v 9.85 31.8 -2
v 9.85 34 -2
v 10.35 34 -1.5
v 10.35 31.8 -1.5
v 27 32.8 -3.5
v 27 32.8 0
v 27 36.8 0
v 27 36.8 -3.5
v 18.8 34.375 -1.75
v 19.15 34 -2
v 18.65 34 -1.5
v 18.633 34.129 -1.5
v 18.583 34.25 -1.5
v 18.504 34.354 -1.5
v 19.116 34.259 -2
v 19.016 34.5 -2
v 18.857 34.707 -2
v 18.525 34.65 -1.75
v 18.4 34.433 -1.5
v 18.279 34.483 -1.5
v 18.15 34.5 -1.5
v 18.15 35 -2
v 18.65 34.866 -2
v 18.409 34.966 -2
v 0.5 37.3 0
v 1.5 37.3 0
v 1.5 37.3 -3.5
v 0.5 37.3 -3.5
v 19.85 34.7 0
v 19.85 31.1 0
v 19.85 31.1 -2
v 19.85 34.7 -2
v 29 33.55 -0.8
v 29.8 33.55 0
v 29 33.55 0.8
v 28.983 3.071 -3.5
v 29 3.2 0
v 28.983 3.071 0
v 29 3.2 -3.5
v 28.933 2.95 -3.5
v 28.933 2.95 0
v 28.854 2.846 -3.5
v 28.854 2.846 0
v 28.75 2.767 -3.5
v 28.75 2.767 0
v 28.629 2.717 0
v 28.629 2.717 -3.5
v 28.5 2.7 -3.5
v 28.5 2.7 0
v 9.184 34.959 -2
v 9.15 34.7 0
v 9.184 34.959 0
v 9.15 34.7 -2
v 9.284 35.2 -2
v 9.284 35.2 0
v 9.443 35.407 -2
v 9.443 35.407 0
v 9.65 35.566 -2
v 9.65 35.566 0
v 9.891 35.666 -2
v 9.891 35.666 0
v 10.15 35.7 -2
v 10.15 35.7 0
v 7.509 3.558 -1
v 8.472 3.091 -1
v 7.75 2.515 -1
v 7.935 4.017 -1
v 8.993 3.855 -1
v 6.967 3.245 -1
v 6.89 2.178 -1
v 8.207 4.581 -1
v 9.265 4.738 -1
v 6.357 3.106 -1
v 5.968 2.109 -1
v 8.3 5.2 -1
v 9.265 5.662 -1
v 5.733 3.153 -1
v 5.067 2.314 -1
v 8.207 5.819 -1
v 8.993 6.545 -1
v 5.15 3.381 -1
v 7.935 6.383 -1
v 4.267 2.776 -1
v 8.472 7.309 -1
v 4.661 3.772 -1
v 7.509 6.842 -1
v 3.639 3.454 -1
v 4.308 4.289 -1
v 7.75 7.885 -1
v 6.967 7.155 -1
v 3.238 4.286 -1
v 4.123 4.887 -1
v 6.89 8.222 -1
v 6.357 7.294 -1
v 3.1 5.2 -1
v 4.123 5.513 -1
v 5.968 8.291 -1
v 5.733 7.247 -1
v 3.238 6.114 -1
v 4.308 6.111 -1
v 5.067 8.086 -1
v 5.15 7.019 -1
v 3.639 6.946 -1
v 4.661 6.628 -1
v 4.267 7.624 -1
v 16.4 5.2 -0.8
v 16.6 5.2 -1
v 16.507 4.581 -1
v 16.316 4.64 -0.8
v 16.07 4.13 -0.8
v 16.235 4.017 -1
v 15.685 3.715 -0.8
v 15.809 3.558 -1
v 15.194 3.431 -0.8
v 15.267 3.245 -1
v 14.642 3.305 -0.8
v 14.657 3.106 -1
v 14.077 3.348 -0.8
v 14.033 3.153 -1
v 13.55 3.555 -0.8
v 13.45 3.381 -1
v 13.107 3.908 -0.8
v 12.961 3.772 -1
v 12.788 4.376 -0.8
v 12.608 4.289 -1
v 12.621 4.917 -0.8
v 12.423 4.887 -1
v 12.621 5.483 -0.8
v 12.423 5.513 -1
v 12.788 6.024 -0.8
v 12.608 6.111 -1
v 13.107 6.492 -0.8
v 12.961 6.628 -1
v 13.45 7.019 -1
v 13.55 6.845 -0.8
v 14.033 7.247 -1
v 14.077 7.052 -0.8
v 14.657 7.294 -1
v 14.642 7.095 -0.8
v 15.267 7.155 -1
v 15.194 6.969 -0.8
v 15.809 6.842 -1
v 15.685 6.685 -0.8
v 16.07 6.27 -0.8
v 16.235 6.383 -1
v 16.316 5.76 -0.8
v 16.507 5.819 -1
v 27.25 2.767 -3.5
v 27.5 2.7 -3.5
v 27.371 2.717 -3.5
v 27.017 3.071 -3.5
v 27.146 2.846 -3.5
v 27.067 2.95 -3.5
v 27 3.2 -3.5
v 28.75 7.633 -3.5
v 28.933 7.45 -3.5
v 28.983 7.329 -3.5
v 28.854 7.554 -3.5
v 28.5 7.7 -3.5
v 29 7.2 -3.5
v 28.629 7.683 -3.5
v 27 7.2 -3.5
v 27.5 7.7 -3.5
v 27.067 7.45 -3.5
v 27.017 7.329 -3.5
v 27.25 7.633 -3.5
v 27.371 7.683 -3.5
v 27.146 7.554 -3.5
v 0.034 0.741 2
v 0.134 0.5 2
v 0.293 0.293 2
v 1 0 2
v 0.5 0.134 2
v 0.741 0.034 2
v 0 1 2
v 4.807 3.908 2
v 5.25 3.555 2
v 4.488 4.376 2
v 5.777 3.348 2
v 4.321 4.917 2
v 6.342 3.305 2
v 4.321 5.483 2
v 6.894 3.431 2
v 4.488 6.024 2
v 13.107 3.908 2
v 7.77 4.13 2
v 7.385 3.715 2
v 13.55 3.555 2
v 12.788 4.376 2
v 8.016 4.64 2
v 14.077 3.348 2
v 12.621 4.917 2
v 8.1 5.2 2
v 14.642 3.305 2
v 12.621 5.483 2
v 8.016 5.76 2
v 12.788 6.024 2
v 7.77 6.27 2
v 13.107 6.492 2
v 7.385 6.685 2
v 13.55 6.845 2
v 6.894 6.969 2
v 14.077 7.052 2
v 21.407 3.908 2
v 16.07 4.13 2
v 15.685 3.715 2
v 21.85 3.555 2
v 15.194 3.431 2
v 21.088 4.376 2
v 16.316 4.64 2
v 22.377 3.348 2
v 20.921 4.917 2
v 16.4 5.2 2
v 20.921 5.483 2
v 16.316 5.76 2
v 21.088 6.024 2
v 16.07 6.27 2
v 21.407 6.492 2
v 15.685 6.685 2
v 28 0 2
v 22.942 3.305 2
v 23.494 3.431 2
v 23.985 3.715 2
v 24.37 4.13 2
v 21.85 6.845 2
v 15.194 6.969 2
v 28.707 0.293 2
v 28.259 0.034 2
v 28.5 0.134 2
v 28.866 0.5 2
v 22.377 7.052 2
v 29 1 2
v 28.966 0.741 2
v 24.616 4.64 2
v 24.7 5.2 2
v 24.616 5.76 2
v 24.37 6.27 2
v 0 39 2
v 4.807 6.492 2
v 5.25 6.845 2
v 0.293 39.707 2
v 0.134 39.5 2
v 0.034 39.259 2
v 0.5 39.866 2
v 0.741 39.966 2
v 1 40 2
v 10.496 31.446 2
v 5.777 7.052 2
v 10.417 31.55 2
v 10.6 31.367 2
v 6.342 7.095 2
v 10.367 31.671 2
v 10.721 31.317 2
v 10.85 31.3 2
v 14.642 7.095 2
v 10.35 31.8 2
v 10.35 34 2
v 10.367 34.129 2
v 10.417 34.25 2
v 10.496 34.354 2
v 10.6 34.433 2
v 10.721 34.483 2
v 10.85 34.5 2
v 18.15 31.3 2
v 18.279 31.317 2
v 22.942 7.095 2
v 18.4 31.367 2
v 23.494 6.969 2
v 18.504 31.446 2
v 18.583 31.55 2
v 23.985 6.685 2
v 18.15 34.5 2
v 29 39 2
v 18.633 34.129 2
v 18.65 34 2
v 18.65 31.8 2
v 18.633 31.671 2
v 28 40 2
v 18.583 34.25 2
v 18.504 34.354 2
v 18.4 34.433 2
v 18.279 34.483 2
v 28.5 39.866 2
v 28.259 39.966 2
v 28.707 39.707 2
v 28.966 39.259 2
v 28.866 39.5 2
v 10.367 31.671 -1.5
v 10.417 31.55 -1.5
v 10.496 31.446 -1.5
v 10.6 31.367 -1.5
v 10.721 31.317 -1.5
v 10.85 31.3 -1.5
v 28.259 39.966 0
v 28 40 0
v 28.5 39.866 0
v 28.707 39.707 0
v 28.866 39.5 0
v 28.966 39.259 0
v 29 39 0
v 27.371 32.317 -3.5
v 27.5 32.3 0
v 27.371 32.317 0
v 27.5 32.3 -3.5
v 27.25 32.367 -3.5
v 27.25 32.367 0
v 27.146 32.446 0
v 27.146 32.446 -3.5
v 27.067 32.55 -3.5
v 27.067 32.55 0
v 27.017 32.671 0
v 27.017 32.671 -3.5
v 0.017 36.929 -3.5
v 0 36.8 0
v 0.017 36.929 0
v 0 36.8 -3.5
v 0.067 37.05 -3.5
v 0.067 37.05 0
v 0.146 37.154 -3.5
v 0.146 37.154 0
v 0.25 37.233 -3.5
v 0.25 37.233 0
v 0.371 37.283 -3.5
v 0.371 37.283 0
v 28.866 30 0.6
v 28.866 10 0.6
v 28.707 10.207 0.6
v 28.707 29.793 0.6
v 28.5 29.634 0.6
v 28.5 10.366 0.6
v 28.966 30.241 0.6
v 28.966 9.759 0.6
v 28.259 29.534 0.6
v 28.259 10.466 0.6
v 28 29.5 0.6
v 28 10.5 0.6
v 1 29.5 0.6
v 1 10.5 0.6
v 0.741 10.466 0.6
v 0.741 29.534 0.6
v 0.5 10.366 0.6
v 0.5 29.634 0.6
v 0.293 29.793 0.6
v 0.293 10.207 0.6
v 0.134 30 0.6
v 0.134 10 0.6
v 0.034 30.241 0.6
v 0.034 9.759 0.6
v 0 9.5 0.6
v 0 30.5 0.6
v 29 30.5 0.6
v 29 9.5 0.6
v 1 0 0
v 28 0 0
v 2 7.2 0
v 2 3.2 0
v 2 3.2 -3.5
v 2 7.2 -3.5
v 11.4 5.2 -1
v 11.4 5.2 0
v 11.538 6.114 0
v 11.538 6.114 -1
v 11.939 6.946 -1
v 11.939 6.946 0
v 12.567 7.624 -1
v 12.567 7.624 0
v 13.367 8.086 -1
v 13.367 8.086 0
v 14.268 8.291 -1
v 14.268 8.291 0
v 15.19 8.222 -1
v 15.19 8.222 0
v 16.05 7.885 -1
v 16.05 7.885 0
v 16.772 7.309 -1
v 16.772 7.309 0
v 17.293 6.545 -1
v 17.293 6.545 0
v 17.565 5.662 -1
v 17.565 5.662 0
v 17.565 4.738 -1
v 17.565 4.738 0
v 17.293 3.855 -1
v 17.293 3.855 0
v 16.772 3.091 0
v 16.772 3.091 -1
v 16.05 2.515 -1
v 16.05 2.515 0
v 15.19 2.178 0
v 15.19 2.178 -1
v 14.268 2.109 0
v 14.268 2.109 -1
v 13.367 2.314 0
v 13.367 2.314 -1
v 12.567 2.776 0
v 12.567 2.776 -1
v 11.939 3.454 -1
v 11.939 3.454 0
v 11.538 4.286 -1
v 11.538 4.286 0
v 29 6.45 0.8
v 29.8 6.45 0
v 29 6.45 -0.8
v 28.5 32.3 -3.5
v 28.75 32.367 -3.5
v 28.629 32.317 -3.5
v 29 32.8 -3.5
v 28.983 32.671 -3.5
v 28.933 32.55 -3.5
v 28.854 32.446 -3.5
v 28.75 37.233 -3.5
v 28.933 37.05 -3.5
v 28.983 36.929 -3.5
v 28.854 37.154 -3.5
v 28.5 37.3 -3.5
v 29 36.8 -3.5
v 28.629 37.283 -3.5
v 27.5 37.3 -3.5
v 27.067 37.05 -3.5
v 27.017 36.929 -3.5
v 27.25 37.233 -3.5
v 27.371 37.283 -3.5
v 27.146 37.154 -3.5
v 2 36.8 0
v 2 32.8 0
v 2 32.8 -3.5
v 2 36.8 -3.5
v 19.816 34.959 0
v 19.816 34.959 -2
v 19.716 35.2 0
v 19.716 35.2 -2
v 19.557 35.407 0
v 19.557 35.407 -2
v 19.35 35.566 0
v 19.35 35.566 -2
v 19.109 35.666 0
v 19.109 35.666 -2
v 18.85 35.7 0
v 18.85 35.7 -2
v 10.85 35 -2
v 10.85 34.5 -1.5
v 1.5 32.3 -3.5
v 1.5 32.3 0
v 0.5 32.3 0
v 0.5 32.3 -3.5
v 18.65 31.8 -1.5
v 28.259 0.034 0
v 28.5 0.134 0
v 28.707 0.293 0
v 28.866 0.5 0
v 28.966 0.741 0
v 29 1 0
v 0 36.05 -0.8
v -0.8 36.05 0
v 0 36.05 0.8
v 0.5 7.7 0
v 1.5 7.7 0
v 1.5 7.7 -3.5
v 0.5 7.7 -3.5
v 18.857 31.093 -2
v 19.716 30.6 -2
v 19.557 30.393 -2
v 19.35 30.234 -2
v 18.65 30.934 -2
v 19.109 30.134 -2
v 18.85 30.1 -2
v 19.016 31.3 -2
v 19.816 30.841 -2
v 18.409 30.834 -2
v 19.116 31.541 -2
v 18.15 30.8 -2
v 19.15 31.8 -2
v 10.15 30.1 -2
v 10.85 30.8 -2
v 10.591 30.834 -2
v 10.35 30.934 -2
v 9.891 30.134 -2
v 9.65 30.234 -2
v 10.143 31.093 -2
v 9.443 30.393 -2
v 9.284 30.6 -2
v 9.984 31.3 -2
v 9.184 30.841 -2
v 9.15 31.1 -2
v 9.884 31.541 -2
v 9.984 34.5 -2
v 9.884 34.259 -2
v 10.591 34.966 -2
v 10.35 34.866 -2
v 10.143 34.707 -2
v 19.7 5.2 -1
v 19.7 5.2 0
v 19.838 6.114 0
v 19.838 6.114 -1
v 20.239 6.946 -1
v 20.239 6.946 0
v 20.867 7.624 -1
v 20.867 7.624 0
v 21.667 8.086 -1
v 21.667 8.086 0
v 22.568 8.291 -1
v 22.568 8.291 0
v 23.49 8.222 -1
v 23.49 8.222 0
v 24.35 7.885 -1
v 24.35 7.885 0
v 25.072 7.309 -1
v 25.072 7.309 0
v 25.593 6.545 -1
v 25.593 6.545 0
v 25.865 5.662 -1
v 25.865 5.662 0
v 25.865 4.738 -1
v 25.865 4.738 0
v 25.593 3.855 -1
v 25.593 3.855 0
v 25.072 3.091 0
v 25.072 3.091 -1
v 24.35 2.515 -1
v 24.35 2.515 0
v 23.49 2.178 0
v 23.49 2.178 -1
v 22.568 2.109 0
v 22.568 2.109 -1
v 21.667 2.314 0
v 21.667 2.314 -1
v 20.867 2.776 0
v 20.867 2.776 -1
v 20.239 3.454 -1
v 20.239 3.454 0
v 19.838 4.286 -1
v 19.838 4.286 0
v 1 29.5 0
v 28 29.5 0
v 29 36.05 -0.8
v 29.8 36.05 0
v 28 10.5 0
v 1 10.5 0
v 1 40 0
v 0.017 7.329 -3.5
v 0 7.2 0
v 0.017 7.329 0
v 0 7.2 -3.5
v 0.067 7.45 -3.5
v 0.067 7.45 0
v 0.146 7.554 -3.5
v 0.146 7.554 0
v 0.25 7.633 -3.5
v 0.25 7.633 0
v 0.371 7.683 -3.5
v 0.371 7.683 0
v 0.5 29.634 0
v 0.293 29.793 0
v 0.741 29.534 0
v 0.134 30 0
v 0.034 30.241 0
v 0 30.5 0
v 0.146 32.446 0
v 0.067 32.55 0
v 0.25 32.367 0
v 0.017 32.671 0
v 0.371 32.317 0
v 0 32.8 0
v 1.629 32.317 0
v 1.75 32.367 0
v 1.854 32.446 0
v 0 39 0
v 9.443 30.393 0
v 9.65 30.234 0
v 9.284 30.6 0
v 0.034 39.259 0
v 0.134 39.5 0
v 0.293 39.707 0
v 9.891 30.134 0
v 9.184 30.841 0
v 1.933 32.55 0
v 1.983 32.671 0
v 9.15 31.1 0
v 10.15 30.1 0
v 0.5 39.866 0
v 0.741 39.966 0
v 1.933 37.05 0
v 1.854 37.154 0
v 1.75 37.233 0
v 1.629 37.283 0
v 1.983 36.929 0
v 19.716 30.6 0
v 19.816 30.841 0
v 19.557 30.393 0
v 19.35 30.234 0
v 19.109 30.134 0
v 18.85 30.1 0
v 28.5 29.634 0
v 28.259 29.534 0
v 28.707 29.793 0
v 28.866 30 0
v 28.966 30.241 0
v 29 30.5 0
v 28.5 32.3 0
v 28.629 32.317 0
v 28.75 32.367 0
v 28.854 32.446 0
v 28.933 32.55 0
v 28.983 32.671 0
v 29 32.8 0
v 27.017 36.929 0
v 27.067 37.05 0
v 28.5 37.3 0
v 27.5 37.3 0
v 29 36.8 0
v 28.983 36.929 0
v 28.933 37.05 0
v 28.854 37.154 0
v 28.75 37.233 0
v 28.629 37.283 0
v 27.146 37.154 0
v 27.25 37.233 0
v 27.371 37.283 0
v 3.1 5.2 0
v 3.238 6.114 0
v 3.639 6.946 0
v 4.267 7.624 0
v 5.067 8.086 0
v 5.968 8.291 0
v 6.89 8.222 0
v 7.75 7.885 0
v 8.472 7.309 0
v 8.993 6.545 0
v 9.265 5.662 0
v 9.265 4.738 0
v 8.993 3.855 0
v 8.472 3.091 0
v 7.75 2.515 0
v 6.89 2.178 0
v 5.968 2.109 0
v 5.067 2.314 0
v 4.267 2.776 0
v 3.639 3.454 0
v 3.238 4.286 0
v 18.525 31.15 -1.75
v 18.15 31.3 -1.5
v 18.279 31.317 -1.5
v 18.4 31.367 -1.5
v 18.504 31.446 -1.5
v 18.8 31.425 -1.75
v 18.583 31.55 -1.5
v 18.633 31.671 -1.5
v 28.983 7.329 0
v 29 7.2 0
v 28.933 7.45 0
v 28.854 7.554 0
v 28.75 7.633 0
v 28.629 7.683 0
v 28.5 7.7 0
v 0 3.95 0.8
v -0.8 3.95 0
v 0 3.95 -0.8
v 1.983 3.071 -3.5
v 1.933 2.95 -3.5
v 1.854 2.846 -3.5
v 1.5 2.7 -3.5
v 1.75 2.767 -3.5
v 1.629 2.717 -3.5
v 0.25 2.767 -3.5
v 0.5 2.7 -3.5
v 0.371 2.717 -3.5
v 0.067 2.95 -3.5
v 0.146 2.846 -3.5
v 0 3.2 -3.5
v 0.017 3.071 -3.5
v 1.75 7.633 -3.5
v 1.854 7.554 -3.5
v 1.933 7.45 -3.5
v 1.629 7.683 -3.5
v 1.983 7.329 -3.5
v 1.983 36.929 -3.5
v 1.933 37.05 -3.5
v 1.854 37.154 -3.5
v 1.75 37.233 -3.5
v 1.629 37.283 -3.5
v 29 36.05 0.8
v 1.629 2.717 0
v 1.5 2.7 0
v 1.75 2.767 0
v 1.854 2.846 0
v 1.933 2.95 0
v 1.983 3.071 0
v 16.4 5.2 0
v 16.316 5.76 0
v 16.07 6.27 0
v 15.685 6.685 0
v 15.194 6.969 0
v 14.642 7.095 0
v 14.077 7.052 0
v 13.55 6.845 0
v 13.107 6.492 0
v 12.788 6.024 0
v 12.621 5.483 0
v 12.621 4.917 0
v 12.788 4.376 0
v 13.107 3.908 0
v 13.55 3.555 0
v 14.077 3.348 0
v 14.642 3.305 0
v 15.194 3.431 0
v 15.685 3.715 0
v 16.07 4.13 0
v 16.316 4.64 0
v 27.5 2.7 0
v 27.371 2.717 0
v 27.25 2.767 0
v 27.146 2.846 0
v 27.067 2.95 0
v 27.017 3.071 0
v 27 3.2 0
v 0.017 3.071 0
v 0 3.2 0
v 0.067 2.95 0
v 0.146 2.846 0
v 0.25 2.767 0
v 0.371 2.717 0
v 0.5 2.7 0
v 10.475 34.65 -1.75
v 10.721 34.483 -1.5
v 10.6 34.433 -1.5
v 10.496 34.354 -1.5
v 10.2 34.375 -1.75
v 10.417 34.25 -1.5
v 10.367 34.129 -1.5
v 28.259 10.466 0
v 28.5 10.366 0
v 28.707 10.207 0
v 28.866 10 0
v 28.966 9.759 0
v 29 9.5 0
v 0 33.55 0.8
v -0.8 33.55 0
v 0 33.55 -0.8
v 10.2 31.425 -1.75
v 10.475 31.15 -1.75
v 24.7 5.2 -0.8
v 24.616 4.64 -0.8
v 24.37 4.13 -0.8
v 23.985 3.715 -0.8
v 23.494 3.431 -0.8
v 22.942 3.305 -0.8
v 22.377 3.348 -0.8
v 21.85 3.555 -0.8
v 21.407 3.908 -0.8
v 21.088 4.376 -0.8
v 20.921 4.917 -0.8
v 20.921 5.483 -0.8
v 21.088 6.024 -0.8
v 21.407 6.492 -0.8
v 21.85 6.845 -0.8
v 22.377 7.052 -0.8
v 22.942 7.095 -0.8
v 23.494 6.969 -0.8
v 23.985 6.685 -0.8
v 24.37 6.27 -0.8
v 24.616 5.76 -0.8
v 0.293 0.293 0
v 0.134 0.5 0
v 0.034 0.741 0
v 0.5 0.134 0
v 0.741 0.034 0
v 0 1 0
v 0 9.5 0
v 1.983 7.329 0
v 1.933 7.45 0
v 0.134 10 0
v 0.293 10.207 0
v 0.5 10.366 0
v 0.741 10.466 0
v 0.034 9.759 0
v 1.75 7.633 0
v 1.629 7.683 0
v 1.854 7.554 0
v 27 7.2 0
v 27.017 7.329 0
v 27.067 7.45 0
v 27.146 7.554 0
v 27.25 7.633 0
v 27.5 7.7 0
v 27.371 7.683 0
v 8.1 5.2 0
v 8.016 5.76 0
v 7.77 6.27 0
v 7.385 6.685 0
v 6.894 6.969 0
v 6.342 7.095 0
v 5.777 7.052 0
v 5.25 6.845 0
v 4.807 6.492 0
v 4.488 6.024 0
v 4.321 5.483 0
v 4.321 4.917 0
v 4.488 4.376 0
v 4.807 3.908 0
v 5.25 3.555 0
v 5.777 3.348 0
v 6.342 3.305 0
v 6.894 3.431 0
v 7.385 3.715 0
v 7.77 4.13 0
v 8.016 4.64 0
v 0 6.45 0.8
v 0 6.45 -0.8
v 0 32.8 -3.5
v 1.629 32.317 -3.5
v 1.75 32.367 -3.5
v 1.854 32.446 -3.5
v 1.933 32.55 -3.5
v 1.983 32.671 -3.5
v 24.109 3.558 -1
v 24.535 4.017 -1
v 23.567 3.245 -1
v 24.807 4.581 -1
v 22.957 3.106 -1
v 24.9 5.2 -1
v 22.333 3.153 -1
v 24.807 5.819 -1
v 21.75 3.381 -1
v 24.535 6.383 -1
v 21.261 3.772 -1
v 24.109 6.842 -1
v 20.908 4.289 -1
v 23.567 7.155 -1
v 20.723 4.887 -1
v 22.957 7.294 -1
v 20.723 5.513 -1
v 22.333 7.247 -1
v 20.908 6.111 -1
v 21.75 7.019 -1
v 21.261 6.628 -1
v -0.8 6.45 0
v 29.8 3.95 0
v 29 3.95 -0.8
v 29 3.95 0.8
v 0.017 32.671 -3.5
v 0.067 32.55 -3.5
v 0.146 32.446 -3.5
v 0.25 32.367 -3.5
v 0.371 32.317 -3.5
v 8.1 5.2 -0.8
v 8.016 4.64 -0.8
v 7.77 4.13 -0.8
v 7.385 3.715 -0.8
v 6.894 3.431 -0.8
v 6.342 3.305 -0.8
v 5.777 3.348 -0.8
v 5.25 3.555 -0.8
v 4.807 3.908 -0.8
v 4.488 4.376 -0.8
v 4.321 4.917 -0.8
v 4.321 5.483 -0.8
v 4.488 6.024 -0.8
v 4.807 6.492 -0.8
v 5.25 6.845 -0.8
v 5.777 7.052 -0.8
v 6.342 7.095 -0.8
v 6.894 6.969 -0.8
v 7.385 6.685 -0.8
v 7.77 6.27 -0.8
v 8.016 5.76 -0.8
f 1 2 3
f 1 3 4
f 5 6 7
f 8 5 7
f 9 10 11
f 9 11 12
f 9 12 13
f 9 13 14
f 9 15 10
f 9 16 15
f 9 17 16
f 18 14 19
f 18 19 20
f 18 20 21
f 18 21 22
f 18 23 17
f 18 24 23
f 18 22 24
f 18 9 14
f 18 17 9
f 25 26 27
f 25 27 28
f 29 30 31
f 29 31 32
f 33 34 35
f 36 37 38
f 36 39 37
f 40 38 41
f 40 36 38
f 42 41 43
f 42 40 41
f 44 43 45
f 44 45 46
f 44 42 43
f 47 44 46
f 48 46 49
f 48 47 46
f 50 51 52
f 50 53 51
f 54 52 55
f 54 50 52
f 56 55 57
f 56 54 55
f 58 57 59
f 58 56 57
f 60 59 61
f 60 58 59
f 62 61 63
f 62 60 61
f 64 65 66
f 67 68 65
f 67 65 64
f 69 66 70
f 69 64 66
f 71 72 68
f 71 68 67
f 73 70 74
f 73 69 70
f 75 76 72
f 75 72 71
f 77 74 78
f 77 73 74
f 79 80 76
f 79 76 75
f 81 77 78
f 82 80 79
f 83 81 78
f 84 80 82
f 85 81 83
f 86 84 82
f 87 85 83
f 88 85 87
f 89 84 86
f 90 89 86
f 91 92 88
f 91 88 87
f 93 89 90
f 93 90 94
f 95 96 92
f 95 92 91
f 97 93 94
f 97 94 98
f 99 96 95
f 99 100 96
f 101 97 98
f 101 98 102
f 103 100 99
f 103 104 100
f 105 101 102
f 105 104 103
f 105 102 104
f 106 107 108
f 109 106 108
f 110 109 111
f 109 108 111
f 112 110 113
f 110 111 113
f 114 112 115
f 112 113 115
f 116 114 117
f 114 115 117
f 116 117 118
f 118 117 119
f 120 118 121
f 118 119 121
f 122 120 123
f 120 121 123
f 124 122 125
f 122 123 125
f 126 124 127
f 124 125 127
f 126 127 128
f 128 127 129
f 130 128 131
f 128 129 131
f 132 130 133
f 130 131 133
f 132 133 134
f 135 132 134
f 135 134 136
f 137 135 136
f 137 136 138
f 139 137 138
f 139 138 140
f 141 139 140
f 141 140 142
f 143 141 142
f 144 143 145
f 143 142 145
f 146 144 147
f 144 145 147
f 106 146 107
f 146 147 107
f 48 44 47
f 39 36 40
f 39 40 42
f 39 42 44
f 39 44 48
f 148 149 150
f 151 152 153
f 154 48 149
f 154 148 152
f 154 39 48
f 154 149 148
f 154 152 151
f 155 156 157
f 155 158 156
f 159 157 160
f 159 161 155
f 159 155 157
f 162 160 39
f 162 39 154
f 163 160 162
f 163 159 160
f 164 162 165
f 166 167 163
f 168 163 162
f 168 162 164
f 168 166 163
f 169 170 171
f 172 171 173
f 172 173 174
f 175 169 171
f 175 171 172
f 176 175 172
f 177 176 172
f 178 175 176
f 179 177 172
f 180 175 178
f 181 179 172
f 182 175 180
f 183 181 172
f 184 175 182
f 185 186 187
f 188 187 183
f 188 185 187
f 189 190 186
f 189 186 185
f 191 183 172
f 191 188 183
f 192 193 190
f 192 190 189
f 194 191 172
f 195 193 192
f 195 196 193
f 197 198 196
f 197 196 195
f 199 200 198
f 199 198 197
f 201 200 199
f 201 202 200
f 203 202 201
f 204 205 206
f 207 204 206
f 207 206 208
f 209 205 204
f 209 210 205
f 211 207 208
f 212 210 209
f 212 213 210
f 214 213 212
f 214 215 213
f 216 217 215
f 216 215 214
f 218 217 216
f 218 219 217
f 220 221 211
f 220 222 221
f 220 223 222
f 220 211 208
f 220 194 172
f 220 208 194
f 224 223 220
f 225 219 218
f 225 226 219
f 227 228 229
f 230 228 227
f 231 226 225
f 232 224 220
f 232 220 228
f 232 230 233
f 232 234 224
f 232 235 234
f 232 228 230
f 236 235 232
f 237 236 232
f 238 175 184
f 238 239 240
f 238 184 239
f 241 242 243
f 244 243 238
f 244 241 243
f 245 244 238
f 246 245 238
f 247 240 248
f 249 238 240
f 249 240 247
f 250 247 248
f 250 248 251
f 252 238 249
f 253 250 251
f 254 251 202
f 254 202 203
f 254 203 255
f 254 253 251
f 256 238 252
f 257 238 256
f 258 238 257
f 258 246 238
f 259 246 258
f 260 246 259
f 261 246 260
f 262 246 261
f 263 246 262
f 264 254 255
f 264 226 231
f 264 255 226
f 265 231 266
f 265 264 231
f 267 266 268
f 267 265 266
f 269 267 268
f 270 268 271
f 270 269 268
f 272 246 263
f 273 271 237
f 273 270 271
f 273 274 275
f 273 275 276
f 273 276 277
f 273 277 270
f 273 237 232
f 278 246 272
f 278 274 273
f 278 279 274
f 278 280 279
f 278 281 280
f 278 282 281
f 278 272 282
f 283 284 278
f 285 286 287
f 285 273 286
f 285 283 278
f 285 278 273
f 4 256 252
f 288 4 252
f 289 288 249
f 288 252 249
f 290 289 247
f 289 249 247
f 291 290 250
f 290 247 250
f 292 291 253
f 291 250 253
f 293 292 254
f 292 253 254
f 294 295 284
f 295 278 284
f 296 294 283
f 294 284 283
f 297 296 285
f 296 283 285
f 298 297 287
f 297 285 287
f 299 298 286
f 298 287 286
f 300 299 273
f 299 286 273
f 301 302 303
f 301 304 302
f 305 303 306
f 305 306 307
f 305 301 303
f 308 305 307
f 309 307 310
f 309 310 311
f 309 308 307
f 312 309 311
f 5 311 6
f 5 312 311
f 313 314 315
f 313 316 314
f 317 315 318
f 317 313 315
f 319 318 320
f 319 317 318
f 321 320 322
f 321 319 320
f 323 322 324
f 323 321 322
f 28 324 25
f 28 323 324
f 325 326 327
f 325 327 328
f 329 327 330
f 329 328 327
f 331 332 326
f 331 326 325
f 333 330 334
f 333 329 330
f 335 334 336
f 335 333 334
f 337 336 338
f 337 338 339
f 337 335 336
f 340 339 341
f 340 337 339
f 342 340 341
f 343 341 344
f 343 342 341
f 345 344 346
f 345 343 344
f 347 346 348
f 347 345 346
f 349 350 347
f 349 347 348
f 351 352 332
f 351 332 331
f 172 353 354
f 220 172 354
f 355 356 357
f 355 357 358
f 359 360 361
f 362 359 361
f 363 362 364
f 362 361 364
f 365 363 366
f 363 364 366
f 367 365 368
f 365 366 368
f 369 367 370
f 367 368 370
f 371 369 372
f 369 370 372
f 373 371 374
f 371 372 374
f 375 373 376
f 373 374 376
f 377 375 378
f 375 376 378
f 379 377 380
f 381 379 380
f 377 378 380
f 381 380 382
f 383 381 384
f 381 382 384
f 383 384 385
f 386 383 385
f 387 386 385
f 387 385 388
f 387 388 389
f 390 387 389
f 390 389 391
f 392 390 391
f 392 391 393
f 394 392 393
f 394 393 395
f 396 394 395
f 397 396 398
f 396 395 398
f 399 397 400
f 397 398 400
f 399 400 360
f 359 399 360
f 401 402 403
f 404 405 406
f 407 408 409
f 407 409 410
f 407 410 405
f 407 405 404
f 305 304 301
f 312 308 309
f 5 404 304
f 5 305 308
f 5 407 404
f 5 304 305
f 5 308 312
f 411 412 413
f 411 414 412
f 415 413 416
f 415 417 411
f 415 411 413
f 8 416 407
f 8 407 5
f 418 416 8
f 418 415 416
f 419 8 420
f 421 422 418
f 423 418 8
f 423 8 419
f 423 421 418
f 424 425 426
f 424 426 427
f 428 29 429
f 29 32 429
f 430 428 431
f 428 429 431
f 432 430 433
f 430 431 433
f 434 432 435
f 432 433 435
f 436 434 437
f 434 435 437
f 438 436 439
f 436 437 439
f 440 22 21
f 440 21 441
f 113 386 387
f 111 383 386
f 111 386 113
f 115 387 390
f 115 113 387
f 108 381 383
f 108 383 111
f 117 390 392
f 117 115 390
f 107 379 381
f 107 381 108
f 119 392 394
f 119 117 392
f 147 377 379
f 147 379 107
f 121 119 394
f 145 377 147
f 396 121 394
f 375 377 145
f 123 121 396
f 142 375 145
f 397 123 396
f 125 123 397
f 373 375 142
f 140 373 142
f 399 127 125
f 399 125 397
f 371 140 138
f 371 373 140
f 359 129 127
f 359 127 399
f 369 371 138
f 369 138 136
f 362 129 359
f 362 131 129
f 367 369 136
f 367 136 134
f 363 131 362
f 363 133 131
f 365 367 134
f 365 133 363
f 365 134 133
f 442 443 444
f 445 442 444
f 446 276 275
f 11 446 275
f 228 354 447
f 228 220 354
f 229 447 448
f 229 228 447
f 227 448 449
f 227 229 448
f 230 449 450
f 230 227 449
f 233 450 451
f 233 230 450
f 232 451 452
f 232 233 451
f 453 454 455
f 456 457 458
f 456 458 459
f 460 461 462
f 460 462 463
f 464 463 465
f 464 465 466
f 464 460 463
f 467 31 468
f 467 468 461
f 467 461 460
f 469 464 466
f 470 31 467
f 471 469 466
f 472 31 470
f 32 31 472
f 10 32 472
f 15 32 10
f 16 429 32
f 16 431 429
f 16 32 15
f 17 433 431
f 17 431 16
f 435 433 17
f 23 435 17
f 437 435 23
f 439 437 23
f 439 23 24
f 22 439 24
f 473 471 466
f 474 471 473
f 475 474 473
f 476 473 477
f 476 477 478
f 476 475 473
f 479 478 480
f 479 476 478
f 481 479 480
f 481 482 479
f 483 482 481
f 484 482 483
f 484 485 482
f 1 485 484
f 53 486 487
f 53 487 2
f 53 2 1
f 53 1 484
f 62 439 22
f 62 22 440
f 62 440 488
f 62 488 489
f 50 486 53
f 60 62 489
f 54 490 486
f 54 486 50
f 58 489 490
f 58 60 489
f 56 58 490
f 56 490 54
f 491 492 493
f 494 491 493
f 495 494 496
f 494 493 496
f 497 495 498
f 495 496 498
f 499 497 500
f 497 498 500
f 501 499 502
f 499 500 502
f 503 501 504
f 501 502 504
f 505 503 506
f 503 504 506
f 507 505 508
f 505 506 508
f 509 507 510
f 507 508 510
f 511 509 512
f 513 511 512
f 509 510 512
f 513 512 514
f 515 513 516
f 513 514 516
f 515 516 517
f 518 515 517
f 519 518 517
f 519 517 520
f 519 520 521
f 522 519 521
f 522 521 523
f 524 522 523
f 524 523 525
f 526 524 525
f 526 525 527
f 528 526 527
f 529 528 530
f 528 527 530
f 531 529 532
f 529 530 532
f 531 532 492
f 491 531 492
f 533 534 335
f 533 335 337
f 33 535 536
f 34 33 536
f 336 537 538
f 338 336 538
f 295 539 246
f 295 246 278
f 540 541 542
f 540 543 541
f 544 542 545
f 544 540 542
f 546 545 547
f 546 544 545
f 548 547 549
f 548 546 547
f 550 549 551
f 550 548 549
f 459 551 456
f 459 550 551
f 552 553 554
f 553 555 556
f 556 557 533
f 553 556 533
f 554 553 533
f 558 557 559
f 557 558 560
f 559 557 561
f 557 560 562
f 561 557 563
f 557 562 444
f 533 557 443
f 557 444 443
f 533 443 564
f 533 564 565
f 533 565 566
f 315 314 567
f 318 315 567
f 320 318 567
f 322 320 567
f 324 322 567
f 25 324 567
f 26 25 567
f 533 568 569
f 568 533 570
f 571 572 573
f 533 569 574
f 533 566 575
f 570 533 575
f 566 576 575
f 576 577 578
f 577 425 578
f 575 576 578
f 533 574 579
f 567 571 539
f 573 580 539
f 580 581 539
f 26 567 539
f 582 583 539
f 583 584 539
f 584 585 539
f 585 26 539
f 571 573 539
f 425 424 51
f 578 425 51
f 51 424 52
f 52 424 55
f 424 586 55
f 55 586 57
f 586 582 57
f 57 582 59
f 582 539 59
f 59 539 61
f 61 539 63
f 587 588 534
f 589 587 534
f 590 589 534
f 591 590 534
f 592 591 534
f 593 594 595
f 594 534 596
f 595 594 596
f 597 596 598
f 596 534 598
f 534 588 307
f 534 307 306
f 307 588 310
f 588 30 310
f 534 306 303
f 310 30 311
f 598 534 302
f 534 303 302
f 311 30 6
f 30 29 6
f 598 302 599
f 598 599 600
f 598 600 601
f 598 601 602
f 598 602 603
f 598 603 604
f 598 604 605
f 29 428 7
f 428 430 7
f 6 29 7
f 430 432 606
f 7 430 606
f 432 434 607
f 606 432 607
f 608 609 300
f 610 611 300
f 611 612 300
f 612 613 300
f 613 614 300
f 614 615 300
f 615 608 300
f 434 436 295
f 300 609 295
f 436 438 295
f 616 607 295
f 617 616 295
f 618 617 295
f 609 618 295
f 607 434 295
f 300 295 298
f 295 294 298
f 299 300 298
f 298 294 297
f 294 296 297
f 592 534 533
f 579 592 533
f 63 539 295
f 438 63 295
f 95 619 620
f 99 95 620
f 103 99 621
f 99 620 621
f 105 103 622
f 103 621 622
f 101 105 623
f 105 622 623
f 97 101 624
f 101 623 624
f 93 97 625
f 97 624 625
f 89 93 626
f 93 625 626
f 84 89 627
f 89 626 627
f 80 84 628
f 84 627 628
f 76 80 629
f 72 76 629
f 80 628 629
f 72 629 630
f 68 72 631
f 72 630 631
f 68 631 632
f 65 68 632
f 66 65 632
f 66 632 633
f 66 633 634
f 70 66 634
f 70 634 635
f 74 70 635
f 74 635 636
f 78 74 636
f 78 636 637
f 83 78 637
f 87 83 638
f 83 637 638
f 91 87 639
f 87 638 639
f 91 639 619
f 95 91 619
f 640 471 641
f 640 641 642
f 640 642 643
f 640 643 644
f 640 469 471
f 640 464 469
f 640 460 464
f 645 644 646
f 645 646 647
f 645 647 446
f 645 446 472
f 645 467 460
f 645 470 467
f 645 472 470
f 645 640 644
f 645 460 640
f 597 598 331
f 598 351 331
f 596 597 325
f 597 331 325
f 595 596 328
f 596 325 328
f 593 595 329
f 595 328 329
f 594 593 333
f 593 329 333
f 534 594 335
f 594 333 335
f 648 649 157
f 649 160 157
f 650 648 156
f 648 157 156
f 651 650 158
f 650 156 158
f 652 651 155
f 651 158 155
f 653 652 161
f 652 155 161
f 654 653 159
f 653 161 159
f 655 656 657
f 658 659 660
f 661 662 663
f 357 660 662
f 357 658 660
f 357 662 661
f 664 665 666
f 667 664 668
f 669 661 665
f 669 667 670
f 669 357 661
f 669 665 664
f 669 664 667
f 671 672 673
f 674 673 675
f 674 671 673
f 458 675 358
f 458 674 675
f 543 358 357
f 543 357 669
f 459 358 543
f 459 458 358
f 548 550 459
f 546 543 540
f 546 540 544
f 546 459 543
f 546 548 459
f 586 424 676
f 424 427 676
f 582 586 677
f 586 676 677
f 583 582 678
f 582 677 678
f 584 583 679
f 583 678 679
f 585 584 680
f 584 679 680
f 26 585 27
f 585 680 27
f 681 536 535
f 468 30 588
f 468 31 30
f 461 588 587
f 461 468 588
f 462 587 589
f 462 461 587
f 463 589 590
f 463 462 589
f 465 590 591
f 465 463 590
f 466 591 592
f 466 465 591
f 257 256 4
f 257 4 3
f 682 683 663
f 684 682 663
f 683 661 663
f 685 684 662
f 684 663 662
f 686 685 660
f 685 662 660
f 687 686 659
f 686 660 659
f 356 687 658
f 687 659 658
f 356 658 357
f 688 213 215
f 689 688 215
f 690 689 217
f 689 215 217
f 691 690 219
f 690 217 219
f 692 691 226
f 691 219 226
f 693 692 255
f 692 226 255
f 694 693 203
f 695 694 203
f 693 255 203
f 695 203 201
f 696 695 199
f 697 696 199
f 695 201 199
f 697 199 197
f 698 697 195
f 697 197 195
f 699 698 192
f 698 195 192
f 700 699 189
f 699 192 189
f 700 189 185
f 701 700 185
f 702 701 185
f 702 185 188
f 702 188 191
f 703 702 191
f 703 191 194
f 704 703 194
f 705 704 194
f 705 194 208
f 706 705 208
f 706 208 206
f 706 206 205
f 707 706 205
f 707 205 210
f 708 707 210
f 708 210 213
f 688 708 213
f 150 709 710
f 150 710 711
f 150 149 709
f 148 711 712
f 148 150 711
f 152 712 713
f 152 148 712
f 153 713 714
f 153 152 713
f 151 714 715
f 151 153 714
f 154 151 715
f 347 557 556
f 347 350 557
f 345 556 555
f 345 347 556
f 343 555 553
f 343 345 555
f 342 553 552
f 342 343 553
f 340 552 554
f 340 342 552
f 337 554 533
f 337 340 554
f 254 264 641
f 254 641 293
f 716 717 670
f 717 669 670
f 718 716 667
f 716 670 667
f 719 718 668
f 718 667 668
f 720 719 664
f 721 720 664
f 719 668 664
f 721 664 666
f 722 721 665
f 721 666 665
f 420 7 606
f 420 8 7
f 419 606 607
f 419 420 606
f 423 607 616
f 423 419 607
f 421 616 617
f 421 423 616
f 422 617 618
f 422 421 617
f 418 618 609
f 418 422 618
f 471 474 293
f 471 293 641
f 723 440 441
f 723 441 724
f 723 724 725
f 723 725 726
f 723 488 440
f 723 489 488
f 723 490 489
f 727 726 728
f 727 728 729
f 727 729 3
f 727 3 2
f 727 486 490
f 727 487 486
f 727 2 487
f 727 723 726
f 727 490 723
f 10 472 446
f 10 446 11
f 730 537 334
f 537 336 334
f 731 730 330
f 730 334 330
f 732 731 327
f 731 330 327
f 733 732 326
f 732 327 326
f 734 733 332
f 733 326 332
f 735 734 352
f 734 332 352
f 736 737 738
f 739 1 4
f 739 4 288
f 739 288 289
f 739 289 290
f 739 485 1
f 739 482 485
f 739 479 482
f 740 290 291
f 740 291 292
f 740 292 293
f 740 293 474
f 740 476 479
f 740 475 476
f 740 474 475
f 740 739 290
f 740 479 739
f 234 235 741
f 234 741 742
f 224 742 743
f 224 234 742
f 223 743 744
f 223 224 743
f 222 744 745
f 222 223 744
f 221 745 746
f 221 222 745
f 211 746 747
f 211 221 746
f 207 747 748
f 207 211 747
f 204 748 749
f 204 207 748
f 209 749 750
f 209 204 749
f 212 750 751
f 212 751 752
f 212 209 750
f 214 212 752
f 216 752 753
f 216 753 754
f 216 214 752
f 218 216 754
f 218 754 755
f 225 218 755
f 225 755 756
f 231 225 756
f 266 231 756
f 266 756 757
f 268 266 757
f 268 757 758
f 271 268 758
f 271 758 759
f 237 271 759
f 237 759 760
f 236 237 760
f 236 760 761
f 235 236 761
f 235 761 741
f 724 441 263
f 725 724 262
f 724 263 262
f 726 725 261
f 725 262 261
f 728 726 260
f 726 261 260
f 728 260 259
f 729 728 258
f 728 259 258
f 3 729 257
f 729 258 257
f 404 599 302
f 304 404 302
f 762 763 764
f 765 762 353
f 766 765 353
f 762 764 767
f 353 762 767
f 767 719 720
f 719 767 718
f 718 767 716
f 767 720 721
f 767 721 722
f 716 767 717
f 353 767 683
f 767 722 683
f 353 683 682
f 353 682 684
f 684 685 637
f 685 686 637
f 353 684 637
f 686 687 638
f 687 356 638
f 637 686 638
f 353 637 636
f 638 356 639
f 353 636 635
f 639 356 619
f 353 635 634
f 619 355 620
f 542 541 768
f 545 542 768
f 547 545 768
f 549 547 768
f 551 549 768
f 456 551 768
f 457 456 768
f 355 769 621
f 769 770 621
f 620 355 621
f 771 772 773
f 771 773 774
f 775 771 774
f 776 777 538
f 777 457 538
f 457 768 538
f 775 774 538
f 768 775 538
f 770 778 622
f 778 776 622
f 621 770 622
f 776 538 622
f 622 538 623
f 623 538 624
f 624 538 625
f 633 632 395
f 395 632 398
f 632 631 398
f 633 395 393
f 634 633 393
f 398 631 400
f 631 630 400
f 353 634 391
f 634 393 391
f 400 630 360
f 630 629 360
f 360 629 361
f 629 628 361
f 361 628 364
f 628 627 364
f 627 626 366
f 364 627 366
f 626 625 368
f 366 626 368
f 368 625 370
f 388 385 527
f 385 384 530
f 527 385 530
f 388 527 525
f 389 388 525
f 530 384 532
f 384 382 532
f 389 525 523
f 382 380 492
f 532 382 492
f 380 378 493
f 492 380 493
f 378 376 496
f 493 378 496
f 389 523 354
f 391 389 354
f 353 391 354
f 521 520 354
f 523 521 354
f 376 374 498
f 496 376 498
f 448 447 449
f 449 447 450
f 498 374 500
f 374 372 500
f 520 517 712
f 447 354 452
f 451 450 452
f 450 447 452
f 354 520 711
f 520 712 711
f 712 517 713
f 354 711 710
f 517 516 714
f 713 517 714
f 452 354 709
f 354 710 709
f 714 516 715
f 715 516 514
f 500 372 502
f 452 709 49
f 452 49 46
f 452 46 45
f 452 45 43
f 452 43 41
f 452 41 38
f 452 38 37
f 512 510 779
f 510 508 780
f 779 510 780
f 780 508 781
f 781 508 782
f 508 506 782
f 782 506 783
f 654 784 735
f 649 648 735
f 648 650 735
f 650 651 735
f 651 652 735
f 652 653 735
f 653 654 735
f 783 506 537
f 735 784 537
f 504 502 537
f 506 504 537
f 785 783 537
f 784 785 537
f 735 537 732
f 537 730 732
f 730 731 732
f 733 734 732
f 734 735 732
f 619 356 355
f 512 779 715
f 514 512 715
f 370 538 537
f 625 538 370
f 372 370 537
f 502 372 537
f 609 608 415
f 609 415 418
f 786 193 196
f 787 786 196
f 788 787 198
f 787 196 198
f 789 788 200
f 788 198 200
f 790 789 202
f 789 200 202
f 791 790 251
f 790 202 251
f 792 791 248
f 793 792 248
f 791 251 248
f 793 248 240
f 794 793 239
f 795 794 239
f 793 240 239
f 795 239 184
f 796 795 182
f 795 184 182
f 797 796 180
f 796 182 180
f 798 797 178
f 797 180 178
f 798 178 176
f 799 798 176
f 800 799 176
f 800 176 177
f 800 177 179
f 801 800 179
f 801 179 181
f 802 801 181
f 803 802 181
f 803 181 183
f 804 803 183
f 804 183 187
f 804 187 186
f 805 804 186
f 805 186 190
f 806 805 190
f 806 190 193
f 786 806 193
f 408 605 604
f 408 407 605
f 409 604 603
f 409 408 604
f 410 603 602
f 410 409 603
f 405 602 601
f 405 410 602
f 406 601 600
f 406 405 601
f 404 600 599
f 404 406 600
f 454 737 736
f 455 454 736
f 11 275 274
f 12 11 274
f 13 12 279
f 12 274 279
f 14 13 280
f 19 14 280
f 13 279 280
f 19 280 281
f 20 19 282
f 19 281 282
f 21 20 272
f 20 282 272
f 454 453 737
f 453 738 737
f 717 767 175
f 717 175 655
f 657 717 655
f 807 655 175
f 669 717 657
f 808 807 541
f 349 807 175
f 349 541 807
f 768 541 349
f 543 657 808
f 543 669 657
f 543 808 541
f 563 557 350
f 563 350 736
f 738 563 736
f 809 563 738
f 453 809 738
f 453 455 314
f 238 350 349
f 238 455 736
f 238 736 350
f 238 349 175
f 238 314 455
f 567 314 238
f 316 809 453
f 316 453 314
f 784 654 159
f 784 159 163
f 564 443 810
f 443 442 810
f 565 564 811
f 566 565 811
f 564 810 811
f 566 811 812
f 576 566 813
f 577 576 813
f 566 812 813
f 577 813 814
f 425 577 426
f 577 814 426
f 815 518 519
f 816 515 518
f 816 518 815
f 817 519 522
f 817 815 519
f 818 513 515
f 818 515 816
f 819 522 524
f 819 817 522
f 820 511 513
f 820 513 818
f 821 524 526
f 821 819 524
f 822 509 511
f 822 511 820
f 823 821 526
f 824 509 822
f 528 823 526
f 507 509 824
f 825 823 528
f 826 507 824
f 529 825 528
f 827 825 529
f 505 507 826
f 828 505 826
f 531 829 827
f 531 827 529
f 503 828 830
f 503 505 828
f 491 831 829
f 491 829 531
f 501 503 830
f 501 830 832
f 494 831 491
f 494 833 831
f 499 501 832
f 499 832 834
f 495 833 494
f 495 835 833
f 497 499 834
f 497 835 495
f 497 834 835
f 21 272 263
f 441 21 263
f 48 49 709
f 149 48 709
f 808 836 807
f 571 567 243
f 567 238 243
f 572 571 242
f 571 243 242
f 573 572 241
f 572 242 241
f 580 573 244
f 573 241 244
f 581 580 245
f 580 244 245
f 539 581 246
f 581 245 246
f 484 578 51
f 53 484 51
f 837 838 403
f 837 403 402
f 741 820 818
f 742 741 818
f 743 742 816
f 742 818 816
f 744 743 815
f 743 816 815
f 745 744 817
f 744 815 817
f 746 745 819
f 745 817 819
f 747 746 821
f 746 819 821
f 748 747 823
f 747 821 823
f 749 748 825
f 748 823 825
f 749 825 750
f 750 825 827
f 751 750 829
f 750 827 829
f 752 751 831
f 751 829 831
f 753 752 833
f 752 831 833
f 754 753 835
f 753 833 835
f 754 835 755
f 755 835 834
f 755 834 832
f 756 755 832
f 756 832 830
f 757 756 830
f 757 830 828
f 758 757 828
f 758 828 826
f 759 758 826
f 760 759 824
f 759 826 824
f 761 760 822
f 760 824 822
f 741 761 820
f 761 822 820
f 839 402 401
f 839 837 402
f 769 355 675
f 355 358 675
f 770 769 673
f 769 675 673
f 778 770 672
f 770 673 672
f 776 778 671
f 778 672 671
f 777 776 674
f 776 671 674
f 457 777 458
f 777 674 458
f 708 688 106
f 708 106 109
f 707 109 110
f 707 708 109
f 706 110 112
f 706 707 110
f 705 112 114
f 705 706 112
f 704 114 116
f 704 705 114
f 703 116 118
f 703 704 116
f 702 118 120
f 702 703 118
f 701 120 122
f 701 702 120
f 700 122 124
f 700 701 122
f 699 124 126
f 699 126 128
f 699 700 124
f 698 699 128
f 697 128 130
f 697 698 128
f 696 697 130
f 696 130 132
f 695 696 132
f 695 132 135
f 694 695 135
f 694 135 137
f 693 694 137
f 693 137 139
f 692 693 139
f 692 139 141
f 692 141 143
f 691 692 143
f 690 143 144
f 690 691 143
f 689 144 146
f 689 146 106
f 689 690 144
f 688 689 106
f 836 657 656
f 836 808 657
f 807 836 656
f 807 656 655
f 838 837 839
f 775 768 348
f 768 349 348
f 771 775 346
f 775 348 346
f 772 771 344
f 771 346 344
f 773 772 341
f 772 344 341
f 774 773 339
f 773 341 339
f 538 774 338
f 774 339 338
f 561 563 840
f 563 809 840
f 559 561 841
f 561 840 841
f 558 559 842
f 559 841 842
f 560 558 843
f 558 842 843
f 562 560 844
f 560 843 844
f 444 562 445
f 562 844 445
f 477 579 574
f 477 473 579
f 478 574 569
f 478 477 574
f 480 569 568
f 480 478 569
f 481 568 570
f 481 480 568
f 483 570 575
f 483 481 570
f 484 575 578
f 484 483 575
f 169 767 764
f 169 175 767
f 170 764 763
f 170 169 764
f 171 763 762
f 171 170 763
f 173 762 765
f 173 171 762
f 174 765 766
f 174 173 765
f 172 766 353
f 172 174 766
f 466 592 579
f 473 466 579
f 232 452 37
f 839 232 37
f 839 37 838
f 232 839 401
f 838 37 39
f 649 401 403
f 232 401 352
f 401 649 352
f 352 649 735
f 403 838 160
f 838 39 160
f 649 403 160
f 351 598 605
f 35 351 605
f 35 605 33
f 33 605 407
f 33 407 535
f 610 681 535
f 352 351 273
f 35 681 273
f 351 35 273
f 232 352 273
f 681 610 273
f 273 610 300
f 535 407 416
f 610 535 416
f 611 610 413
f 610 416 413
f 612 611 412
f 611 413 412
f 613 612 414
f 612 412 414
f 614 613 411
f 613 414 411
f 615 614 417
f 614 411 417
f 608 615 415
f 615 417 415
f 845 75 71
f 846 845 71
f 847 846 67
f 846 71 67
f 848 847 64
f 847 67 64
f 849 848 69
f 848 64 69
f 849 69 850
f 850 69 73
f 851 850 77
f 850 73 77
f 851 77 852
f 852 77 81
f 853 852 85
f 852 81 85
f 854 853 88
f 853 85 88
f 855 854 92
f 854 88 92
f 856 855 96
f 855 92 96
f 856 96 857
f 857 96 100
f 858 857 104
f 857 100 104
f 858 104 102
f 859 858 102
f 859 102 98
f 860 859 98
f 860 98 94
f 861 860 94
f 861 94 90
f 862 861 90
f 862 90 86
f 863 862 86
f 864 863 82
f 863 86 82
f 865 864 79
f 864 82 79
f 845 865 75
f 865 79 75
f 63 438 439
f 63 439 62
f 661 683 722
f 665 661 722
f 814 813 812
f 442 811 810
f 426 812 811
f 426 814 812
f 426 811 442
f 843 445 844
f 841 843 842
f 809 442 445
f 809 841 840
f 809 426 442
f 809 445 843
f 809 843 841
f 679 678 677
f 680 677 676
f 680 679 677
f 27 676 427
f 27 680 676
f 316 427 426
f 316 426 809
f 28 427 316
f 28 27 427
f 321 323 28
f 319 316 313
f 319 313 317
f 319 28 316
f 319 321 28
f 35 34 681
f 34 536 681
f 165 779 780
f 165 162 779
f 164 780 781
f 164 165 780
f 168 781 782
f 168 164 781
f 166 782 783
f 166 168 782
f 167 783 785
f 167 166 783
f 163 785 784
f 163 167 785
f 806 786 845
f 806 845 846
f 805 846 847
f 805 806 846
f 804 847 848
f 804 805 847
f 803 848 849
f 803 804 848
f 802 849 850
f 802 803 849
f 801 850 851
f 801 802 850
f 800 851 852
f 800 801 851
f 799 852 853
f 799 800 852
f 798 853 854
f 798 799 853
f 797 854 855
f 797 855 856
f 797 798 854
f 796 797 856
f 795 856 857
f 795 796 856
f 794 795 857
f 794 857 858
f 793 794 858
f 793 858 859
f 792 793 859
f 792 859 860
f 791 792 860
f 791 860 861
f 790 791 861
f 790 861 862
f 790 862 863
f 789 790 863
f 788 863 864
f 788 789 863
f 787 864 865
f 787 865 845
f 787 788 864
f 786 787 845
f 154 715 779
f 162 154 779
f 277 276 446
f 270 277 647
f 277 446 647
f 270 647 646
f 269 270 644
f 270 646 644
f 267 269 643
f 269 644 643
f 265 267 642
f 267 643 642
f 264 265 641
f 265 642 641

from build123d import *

# Parameters (mm, degrees)
SKETCH_1_W          = 29
SKETCH_1_H          = 40
EXTRUDE_1_DEPTH     = 2
SKETCH_2_W          = 2
SKETCH_2_H          = 5
EXTRUDE_2_DEPTH     = 3.5
SKETCH_3_W          = 8.3
SKETCH_3_H          = 3.2
CUT_EXTRUDE_1_DEPTH = 50.71166865
SKETCH_4_R          = 1.9
CUT_EXTRUDE_2_DEPTH = 50.71166865
SKETCH_5_W          = 10.7
SKETCH_5_H          = 5.6
SKETCH_5_W_2        = 8.3
SKETCH_5_H_2        = 3.2
EXTRUDE_3_DEPTH     = 2
SKETCH_6_R          = 3.1
SKETCH_6_R_2        = 1.9
EXTRUDE_4_DEPTH     = 1
EXTRUDE_5_DEPTH     = 1.25
FILLET_1_R          = 0.5
FILLET_2_R          = 0.5
CHAMFER_1_SIZE      = 0.2
CHAMFER_2_SIZE      = 0.5
FILLET_3_R          = 1
FILLET_4_R          = 1
SKETCH_9_W          = 29
SKETCH_9_H          = 19
CUT_EXTRUDE_3_DEPTH = 0.6
FILLET_5_R          = 1


with BuildPart() as part:
    # 草图1 → 凸台-拉伸1 (new body)
    with BuildSketch(Plane.XY):
        with Locations((14.5, 20)):
            Rectangle(SKETCH_1_W, SKETCH_1_H)
    extrude(amount=EXTRUDE_1_DEPTH)

    # 草图2 → 凸台-拉伸2 (add)
    with BuildSketch(Plane(origin=(0, 0, 0), x_dir=(-1, 0, 0), z_dir=(0, 0, -1))):
        with Locations((-1, 34.8)):
            Rectangle(SKETCH_2_W, SKETCH_2_H)
        with Locations((-28, 34.8)):
            Rectangle(SKETCH_2_W, SKETCH_2_H)
        with Locations((-1, 5.2)):
            Rectangle(SKETCH_2_W, SKETCH_2_H)
        with Locations((-28, 5.2)):
            Rectangle(SKETCH_2_W, SKETCH_2_H)
    extrude(amount=EXTRUDE_2_DEPTH)

    # 草图3 → 切除-拉伸1 (cut, through all)
    with BuildSketch(Plane.XY.offset(2)):
        with Locations((14.5, 32.9)):
            Rectangle(SKETCH_3_W, SKETCH_3_H)
    extrude(amount=-CUT_EXTRUDE_1_DEPTH, mode=Mode.SUBTRACT)

    # 草图4 → 切除-拉伸2 (cut, through all)
    with BuildSketch(Plane.XY.offset(2)):
        with Locations((14.5, 5.2)):
            Circle(SKETCH_4_R)
        with Locations((6.2, 5.2)):
            Circle(SKETCH_4_R)
        with Locations((22.8, 5.2)):
            Circle(SKETCH_4_R)
    extrude(amount=-CUT_EXTRUDE_2_DEPTH, mode=Mode.SUBTRACT)

    # 草图5 → 凸台-拉伸3 (add)
    with BuildSketch(Plane(origin=(0, 0, 0), x_dir=(-1, 0, 0), z_dir=(0, 0, -1))):
        with Locations((-14.5, 32.9)):
            Rectangle(SKETCH_5_W, SKETCH_5_H)
        with Locations((-14.5, 32.9)):
            Rectangle(SKETCH_5_W_2, SKETCH_5_H_2, mode=Mode.SUBTRACT)
    extrude(amount=EXTRUDE_3_DEPTH)

    # 草图6 → 凸台-拉伸4 (add)
    with BuildSketch(Plane(origin=(0, 0, 0), x_dir=(-1, 0, 0), z_dir=(0, 0, -1))):
        with Locations((-22.8, 5.2)):
            Circle(SKETCH_6_R)
        with Locations(Location((-22.8, 5.2, 0), (0, 0, 180))):
            Circle(SKETCH_6_R_2, mode=Mode.SUBTRACT)
        with Locations((-14.5, 5.2)):
            Circle(SKETCH_6_R)
        with Locations(Location((-14.5, 5.2, 0), (0, 0, 180))):
            Circle(SKETCH_6_R_2, mode=Mode.SUBTRACT)
        with Locations((-6.2, 5.2)):
            Circle(SKETCH_6_R)
        with Locations(Location((-6.2, 5.2, 0), (0, 0, 180))):
            Circle(SKETCH_6_R_2, mode=Mode.SUBTRACT)
    extrude(amount=EXTRUDE_4_DEPTH)

    # 草图10 → 凸台-拉伸5 (add, symmetric)
    with BuildSketch(Plane(origin=(0, 34.8, 0), x_dir=(-1, 0, 0), z_dir=(0, -1, 0))):
        Polygon((-29, 0.8), (-29.8, 0), (-29, -0.8), align=None)
        Polygon((0, -0.8), (0, 0.8), (0.8, 0), align=None)
    extrude_5 = extrude(amount=EXTRUDE_5_DEPTH, both=True)

    # 镜向1: 凸台-拉伸5 across plane
    add(extrude_5.mirror(Plane(origin=(0, 20, 0), x_dir=(0, 0, 1), z_dir=(0, -1, 0))))

    # 圆角1
    fillet_1_edges = [part.edges().sort_by_distance(p)[0] for p in [
        (29, 37.3, -1.75),
        (29, 32.3, -1.75),
        (27, 32.3, -1.75),
        (27, 37.3, -1.75),
        (0, 37.3, -1.75),
        (2, 37.3, -1.75),
        (2, 32.3, -1.75),
        (0, 32.3, -1.75),
        (0, 2.7, -1.75),
        (0, 7.7, -1.75),
        (2, 7.7, -1.75),
        (2, 2.7, -1.75),
        (29, 2.7, -1.75),
        (27, 2.7, -1.75),
        (27, 7.7, -1.75),
        (29, 7.7, -1.75),
    ]]
    fillet(fillet_1_edges, radius=FILLET_1_R)

    # 圆角2
    fillet_2_edges = [part.edges().sort_by_distance(p)[0] for p in [
        (18.65, 34.5, 0),
        (18.65, 31.3, 0),
        (10.35, 31.3, 0),
        (10.35, 34.5, 0),
    ]]
    fillet(fillet_2_edges, radius=FILLET_2_R)

    # 倒角1
    chamfer_1_edges = [part.edges().sort_by_distance(p)[0] for p in [
        (20.9, 5.2, -1),
        (12.6, 5.2, -1),
        (4.3, 5.2, -1),
    ]]
    chamfer(chamfer_1_edges, length=CHAMFER_1_SIZE)

    # 倒角2
    chamfer_2_edges = [part.edges().sort_by_distance(p)[0] for p in [
        (18.65, 32.9, -2),
        (14.5, 31.3, -2),
        (14.5, 34.5, -2),
        (10.35, 32.9, -2),
        (18.503553391, 31.446446609, -2),
        (18.503553391, 34.353553391, -2),
        (10.496446609, 31.446446609, -2),
        (10.496446609, 34.353553391, -2),
    ]]
    chamfer(chamfer_2_edges, length=CHAMFER_2_SIZE)

    # 圆角3
    fillet_3_edges = [part.edges().sort_by_distance(p)[0] for p in [
        (0, 40, 1),
        (29, 40, 1),
        (29, 0, 1),
        (0, 0, 1),
    ]]
    fillet(fillet_3_edges, radius=FILLET_3_R)

    # 圆角4
    fillet_4_edges = [part.edges().sort_by_distance(p)[0] for p in [
        (19.85, 30.1, -1),
        (9.15, 30.1, -1),
        (9.15, 35.7, -1),
        (19.85, 35.7, -1),
    ]]
    fillet(fillet_4_edges, radius=FILLET_4_R)

    # 草图9 → 切除-拉伸3 (cut)
    with BuildSketch(Plane(origin=(0, 0, 0), x_dir=(-1, 0, 0), z_dir=(0, 0, -1))):
        with Locations((-14.5, 20)):
            Rectangle(SKETCH_9_W, SKETCH_9_H)
    extrude(amount=-CUT_EXTRUDE_3_DEPTH, mode=Mode.SUBTRACT)

    # 圆角5
    fillet_5_edges = [part.edges().sort_by_distance(p)[0] for p in [
        (29, 10.5, 0.3),
        (29, 29.5, 0.3),
        (0, 29.5, 0.3),
        (0, 10.5, 0.3),
    ]]
    fillet(fillet_5_edges, radius=FILLET_5_R)


solid = part.part
